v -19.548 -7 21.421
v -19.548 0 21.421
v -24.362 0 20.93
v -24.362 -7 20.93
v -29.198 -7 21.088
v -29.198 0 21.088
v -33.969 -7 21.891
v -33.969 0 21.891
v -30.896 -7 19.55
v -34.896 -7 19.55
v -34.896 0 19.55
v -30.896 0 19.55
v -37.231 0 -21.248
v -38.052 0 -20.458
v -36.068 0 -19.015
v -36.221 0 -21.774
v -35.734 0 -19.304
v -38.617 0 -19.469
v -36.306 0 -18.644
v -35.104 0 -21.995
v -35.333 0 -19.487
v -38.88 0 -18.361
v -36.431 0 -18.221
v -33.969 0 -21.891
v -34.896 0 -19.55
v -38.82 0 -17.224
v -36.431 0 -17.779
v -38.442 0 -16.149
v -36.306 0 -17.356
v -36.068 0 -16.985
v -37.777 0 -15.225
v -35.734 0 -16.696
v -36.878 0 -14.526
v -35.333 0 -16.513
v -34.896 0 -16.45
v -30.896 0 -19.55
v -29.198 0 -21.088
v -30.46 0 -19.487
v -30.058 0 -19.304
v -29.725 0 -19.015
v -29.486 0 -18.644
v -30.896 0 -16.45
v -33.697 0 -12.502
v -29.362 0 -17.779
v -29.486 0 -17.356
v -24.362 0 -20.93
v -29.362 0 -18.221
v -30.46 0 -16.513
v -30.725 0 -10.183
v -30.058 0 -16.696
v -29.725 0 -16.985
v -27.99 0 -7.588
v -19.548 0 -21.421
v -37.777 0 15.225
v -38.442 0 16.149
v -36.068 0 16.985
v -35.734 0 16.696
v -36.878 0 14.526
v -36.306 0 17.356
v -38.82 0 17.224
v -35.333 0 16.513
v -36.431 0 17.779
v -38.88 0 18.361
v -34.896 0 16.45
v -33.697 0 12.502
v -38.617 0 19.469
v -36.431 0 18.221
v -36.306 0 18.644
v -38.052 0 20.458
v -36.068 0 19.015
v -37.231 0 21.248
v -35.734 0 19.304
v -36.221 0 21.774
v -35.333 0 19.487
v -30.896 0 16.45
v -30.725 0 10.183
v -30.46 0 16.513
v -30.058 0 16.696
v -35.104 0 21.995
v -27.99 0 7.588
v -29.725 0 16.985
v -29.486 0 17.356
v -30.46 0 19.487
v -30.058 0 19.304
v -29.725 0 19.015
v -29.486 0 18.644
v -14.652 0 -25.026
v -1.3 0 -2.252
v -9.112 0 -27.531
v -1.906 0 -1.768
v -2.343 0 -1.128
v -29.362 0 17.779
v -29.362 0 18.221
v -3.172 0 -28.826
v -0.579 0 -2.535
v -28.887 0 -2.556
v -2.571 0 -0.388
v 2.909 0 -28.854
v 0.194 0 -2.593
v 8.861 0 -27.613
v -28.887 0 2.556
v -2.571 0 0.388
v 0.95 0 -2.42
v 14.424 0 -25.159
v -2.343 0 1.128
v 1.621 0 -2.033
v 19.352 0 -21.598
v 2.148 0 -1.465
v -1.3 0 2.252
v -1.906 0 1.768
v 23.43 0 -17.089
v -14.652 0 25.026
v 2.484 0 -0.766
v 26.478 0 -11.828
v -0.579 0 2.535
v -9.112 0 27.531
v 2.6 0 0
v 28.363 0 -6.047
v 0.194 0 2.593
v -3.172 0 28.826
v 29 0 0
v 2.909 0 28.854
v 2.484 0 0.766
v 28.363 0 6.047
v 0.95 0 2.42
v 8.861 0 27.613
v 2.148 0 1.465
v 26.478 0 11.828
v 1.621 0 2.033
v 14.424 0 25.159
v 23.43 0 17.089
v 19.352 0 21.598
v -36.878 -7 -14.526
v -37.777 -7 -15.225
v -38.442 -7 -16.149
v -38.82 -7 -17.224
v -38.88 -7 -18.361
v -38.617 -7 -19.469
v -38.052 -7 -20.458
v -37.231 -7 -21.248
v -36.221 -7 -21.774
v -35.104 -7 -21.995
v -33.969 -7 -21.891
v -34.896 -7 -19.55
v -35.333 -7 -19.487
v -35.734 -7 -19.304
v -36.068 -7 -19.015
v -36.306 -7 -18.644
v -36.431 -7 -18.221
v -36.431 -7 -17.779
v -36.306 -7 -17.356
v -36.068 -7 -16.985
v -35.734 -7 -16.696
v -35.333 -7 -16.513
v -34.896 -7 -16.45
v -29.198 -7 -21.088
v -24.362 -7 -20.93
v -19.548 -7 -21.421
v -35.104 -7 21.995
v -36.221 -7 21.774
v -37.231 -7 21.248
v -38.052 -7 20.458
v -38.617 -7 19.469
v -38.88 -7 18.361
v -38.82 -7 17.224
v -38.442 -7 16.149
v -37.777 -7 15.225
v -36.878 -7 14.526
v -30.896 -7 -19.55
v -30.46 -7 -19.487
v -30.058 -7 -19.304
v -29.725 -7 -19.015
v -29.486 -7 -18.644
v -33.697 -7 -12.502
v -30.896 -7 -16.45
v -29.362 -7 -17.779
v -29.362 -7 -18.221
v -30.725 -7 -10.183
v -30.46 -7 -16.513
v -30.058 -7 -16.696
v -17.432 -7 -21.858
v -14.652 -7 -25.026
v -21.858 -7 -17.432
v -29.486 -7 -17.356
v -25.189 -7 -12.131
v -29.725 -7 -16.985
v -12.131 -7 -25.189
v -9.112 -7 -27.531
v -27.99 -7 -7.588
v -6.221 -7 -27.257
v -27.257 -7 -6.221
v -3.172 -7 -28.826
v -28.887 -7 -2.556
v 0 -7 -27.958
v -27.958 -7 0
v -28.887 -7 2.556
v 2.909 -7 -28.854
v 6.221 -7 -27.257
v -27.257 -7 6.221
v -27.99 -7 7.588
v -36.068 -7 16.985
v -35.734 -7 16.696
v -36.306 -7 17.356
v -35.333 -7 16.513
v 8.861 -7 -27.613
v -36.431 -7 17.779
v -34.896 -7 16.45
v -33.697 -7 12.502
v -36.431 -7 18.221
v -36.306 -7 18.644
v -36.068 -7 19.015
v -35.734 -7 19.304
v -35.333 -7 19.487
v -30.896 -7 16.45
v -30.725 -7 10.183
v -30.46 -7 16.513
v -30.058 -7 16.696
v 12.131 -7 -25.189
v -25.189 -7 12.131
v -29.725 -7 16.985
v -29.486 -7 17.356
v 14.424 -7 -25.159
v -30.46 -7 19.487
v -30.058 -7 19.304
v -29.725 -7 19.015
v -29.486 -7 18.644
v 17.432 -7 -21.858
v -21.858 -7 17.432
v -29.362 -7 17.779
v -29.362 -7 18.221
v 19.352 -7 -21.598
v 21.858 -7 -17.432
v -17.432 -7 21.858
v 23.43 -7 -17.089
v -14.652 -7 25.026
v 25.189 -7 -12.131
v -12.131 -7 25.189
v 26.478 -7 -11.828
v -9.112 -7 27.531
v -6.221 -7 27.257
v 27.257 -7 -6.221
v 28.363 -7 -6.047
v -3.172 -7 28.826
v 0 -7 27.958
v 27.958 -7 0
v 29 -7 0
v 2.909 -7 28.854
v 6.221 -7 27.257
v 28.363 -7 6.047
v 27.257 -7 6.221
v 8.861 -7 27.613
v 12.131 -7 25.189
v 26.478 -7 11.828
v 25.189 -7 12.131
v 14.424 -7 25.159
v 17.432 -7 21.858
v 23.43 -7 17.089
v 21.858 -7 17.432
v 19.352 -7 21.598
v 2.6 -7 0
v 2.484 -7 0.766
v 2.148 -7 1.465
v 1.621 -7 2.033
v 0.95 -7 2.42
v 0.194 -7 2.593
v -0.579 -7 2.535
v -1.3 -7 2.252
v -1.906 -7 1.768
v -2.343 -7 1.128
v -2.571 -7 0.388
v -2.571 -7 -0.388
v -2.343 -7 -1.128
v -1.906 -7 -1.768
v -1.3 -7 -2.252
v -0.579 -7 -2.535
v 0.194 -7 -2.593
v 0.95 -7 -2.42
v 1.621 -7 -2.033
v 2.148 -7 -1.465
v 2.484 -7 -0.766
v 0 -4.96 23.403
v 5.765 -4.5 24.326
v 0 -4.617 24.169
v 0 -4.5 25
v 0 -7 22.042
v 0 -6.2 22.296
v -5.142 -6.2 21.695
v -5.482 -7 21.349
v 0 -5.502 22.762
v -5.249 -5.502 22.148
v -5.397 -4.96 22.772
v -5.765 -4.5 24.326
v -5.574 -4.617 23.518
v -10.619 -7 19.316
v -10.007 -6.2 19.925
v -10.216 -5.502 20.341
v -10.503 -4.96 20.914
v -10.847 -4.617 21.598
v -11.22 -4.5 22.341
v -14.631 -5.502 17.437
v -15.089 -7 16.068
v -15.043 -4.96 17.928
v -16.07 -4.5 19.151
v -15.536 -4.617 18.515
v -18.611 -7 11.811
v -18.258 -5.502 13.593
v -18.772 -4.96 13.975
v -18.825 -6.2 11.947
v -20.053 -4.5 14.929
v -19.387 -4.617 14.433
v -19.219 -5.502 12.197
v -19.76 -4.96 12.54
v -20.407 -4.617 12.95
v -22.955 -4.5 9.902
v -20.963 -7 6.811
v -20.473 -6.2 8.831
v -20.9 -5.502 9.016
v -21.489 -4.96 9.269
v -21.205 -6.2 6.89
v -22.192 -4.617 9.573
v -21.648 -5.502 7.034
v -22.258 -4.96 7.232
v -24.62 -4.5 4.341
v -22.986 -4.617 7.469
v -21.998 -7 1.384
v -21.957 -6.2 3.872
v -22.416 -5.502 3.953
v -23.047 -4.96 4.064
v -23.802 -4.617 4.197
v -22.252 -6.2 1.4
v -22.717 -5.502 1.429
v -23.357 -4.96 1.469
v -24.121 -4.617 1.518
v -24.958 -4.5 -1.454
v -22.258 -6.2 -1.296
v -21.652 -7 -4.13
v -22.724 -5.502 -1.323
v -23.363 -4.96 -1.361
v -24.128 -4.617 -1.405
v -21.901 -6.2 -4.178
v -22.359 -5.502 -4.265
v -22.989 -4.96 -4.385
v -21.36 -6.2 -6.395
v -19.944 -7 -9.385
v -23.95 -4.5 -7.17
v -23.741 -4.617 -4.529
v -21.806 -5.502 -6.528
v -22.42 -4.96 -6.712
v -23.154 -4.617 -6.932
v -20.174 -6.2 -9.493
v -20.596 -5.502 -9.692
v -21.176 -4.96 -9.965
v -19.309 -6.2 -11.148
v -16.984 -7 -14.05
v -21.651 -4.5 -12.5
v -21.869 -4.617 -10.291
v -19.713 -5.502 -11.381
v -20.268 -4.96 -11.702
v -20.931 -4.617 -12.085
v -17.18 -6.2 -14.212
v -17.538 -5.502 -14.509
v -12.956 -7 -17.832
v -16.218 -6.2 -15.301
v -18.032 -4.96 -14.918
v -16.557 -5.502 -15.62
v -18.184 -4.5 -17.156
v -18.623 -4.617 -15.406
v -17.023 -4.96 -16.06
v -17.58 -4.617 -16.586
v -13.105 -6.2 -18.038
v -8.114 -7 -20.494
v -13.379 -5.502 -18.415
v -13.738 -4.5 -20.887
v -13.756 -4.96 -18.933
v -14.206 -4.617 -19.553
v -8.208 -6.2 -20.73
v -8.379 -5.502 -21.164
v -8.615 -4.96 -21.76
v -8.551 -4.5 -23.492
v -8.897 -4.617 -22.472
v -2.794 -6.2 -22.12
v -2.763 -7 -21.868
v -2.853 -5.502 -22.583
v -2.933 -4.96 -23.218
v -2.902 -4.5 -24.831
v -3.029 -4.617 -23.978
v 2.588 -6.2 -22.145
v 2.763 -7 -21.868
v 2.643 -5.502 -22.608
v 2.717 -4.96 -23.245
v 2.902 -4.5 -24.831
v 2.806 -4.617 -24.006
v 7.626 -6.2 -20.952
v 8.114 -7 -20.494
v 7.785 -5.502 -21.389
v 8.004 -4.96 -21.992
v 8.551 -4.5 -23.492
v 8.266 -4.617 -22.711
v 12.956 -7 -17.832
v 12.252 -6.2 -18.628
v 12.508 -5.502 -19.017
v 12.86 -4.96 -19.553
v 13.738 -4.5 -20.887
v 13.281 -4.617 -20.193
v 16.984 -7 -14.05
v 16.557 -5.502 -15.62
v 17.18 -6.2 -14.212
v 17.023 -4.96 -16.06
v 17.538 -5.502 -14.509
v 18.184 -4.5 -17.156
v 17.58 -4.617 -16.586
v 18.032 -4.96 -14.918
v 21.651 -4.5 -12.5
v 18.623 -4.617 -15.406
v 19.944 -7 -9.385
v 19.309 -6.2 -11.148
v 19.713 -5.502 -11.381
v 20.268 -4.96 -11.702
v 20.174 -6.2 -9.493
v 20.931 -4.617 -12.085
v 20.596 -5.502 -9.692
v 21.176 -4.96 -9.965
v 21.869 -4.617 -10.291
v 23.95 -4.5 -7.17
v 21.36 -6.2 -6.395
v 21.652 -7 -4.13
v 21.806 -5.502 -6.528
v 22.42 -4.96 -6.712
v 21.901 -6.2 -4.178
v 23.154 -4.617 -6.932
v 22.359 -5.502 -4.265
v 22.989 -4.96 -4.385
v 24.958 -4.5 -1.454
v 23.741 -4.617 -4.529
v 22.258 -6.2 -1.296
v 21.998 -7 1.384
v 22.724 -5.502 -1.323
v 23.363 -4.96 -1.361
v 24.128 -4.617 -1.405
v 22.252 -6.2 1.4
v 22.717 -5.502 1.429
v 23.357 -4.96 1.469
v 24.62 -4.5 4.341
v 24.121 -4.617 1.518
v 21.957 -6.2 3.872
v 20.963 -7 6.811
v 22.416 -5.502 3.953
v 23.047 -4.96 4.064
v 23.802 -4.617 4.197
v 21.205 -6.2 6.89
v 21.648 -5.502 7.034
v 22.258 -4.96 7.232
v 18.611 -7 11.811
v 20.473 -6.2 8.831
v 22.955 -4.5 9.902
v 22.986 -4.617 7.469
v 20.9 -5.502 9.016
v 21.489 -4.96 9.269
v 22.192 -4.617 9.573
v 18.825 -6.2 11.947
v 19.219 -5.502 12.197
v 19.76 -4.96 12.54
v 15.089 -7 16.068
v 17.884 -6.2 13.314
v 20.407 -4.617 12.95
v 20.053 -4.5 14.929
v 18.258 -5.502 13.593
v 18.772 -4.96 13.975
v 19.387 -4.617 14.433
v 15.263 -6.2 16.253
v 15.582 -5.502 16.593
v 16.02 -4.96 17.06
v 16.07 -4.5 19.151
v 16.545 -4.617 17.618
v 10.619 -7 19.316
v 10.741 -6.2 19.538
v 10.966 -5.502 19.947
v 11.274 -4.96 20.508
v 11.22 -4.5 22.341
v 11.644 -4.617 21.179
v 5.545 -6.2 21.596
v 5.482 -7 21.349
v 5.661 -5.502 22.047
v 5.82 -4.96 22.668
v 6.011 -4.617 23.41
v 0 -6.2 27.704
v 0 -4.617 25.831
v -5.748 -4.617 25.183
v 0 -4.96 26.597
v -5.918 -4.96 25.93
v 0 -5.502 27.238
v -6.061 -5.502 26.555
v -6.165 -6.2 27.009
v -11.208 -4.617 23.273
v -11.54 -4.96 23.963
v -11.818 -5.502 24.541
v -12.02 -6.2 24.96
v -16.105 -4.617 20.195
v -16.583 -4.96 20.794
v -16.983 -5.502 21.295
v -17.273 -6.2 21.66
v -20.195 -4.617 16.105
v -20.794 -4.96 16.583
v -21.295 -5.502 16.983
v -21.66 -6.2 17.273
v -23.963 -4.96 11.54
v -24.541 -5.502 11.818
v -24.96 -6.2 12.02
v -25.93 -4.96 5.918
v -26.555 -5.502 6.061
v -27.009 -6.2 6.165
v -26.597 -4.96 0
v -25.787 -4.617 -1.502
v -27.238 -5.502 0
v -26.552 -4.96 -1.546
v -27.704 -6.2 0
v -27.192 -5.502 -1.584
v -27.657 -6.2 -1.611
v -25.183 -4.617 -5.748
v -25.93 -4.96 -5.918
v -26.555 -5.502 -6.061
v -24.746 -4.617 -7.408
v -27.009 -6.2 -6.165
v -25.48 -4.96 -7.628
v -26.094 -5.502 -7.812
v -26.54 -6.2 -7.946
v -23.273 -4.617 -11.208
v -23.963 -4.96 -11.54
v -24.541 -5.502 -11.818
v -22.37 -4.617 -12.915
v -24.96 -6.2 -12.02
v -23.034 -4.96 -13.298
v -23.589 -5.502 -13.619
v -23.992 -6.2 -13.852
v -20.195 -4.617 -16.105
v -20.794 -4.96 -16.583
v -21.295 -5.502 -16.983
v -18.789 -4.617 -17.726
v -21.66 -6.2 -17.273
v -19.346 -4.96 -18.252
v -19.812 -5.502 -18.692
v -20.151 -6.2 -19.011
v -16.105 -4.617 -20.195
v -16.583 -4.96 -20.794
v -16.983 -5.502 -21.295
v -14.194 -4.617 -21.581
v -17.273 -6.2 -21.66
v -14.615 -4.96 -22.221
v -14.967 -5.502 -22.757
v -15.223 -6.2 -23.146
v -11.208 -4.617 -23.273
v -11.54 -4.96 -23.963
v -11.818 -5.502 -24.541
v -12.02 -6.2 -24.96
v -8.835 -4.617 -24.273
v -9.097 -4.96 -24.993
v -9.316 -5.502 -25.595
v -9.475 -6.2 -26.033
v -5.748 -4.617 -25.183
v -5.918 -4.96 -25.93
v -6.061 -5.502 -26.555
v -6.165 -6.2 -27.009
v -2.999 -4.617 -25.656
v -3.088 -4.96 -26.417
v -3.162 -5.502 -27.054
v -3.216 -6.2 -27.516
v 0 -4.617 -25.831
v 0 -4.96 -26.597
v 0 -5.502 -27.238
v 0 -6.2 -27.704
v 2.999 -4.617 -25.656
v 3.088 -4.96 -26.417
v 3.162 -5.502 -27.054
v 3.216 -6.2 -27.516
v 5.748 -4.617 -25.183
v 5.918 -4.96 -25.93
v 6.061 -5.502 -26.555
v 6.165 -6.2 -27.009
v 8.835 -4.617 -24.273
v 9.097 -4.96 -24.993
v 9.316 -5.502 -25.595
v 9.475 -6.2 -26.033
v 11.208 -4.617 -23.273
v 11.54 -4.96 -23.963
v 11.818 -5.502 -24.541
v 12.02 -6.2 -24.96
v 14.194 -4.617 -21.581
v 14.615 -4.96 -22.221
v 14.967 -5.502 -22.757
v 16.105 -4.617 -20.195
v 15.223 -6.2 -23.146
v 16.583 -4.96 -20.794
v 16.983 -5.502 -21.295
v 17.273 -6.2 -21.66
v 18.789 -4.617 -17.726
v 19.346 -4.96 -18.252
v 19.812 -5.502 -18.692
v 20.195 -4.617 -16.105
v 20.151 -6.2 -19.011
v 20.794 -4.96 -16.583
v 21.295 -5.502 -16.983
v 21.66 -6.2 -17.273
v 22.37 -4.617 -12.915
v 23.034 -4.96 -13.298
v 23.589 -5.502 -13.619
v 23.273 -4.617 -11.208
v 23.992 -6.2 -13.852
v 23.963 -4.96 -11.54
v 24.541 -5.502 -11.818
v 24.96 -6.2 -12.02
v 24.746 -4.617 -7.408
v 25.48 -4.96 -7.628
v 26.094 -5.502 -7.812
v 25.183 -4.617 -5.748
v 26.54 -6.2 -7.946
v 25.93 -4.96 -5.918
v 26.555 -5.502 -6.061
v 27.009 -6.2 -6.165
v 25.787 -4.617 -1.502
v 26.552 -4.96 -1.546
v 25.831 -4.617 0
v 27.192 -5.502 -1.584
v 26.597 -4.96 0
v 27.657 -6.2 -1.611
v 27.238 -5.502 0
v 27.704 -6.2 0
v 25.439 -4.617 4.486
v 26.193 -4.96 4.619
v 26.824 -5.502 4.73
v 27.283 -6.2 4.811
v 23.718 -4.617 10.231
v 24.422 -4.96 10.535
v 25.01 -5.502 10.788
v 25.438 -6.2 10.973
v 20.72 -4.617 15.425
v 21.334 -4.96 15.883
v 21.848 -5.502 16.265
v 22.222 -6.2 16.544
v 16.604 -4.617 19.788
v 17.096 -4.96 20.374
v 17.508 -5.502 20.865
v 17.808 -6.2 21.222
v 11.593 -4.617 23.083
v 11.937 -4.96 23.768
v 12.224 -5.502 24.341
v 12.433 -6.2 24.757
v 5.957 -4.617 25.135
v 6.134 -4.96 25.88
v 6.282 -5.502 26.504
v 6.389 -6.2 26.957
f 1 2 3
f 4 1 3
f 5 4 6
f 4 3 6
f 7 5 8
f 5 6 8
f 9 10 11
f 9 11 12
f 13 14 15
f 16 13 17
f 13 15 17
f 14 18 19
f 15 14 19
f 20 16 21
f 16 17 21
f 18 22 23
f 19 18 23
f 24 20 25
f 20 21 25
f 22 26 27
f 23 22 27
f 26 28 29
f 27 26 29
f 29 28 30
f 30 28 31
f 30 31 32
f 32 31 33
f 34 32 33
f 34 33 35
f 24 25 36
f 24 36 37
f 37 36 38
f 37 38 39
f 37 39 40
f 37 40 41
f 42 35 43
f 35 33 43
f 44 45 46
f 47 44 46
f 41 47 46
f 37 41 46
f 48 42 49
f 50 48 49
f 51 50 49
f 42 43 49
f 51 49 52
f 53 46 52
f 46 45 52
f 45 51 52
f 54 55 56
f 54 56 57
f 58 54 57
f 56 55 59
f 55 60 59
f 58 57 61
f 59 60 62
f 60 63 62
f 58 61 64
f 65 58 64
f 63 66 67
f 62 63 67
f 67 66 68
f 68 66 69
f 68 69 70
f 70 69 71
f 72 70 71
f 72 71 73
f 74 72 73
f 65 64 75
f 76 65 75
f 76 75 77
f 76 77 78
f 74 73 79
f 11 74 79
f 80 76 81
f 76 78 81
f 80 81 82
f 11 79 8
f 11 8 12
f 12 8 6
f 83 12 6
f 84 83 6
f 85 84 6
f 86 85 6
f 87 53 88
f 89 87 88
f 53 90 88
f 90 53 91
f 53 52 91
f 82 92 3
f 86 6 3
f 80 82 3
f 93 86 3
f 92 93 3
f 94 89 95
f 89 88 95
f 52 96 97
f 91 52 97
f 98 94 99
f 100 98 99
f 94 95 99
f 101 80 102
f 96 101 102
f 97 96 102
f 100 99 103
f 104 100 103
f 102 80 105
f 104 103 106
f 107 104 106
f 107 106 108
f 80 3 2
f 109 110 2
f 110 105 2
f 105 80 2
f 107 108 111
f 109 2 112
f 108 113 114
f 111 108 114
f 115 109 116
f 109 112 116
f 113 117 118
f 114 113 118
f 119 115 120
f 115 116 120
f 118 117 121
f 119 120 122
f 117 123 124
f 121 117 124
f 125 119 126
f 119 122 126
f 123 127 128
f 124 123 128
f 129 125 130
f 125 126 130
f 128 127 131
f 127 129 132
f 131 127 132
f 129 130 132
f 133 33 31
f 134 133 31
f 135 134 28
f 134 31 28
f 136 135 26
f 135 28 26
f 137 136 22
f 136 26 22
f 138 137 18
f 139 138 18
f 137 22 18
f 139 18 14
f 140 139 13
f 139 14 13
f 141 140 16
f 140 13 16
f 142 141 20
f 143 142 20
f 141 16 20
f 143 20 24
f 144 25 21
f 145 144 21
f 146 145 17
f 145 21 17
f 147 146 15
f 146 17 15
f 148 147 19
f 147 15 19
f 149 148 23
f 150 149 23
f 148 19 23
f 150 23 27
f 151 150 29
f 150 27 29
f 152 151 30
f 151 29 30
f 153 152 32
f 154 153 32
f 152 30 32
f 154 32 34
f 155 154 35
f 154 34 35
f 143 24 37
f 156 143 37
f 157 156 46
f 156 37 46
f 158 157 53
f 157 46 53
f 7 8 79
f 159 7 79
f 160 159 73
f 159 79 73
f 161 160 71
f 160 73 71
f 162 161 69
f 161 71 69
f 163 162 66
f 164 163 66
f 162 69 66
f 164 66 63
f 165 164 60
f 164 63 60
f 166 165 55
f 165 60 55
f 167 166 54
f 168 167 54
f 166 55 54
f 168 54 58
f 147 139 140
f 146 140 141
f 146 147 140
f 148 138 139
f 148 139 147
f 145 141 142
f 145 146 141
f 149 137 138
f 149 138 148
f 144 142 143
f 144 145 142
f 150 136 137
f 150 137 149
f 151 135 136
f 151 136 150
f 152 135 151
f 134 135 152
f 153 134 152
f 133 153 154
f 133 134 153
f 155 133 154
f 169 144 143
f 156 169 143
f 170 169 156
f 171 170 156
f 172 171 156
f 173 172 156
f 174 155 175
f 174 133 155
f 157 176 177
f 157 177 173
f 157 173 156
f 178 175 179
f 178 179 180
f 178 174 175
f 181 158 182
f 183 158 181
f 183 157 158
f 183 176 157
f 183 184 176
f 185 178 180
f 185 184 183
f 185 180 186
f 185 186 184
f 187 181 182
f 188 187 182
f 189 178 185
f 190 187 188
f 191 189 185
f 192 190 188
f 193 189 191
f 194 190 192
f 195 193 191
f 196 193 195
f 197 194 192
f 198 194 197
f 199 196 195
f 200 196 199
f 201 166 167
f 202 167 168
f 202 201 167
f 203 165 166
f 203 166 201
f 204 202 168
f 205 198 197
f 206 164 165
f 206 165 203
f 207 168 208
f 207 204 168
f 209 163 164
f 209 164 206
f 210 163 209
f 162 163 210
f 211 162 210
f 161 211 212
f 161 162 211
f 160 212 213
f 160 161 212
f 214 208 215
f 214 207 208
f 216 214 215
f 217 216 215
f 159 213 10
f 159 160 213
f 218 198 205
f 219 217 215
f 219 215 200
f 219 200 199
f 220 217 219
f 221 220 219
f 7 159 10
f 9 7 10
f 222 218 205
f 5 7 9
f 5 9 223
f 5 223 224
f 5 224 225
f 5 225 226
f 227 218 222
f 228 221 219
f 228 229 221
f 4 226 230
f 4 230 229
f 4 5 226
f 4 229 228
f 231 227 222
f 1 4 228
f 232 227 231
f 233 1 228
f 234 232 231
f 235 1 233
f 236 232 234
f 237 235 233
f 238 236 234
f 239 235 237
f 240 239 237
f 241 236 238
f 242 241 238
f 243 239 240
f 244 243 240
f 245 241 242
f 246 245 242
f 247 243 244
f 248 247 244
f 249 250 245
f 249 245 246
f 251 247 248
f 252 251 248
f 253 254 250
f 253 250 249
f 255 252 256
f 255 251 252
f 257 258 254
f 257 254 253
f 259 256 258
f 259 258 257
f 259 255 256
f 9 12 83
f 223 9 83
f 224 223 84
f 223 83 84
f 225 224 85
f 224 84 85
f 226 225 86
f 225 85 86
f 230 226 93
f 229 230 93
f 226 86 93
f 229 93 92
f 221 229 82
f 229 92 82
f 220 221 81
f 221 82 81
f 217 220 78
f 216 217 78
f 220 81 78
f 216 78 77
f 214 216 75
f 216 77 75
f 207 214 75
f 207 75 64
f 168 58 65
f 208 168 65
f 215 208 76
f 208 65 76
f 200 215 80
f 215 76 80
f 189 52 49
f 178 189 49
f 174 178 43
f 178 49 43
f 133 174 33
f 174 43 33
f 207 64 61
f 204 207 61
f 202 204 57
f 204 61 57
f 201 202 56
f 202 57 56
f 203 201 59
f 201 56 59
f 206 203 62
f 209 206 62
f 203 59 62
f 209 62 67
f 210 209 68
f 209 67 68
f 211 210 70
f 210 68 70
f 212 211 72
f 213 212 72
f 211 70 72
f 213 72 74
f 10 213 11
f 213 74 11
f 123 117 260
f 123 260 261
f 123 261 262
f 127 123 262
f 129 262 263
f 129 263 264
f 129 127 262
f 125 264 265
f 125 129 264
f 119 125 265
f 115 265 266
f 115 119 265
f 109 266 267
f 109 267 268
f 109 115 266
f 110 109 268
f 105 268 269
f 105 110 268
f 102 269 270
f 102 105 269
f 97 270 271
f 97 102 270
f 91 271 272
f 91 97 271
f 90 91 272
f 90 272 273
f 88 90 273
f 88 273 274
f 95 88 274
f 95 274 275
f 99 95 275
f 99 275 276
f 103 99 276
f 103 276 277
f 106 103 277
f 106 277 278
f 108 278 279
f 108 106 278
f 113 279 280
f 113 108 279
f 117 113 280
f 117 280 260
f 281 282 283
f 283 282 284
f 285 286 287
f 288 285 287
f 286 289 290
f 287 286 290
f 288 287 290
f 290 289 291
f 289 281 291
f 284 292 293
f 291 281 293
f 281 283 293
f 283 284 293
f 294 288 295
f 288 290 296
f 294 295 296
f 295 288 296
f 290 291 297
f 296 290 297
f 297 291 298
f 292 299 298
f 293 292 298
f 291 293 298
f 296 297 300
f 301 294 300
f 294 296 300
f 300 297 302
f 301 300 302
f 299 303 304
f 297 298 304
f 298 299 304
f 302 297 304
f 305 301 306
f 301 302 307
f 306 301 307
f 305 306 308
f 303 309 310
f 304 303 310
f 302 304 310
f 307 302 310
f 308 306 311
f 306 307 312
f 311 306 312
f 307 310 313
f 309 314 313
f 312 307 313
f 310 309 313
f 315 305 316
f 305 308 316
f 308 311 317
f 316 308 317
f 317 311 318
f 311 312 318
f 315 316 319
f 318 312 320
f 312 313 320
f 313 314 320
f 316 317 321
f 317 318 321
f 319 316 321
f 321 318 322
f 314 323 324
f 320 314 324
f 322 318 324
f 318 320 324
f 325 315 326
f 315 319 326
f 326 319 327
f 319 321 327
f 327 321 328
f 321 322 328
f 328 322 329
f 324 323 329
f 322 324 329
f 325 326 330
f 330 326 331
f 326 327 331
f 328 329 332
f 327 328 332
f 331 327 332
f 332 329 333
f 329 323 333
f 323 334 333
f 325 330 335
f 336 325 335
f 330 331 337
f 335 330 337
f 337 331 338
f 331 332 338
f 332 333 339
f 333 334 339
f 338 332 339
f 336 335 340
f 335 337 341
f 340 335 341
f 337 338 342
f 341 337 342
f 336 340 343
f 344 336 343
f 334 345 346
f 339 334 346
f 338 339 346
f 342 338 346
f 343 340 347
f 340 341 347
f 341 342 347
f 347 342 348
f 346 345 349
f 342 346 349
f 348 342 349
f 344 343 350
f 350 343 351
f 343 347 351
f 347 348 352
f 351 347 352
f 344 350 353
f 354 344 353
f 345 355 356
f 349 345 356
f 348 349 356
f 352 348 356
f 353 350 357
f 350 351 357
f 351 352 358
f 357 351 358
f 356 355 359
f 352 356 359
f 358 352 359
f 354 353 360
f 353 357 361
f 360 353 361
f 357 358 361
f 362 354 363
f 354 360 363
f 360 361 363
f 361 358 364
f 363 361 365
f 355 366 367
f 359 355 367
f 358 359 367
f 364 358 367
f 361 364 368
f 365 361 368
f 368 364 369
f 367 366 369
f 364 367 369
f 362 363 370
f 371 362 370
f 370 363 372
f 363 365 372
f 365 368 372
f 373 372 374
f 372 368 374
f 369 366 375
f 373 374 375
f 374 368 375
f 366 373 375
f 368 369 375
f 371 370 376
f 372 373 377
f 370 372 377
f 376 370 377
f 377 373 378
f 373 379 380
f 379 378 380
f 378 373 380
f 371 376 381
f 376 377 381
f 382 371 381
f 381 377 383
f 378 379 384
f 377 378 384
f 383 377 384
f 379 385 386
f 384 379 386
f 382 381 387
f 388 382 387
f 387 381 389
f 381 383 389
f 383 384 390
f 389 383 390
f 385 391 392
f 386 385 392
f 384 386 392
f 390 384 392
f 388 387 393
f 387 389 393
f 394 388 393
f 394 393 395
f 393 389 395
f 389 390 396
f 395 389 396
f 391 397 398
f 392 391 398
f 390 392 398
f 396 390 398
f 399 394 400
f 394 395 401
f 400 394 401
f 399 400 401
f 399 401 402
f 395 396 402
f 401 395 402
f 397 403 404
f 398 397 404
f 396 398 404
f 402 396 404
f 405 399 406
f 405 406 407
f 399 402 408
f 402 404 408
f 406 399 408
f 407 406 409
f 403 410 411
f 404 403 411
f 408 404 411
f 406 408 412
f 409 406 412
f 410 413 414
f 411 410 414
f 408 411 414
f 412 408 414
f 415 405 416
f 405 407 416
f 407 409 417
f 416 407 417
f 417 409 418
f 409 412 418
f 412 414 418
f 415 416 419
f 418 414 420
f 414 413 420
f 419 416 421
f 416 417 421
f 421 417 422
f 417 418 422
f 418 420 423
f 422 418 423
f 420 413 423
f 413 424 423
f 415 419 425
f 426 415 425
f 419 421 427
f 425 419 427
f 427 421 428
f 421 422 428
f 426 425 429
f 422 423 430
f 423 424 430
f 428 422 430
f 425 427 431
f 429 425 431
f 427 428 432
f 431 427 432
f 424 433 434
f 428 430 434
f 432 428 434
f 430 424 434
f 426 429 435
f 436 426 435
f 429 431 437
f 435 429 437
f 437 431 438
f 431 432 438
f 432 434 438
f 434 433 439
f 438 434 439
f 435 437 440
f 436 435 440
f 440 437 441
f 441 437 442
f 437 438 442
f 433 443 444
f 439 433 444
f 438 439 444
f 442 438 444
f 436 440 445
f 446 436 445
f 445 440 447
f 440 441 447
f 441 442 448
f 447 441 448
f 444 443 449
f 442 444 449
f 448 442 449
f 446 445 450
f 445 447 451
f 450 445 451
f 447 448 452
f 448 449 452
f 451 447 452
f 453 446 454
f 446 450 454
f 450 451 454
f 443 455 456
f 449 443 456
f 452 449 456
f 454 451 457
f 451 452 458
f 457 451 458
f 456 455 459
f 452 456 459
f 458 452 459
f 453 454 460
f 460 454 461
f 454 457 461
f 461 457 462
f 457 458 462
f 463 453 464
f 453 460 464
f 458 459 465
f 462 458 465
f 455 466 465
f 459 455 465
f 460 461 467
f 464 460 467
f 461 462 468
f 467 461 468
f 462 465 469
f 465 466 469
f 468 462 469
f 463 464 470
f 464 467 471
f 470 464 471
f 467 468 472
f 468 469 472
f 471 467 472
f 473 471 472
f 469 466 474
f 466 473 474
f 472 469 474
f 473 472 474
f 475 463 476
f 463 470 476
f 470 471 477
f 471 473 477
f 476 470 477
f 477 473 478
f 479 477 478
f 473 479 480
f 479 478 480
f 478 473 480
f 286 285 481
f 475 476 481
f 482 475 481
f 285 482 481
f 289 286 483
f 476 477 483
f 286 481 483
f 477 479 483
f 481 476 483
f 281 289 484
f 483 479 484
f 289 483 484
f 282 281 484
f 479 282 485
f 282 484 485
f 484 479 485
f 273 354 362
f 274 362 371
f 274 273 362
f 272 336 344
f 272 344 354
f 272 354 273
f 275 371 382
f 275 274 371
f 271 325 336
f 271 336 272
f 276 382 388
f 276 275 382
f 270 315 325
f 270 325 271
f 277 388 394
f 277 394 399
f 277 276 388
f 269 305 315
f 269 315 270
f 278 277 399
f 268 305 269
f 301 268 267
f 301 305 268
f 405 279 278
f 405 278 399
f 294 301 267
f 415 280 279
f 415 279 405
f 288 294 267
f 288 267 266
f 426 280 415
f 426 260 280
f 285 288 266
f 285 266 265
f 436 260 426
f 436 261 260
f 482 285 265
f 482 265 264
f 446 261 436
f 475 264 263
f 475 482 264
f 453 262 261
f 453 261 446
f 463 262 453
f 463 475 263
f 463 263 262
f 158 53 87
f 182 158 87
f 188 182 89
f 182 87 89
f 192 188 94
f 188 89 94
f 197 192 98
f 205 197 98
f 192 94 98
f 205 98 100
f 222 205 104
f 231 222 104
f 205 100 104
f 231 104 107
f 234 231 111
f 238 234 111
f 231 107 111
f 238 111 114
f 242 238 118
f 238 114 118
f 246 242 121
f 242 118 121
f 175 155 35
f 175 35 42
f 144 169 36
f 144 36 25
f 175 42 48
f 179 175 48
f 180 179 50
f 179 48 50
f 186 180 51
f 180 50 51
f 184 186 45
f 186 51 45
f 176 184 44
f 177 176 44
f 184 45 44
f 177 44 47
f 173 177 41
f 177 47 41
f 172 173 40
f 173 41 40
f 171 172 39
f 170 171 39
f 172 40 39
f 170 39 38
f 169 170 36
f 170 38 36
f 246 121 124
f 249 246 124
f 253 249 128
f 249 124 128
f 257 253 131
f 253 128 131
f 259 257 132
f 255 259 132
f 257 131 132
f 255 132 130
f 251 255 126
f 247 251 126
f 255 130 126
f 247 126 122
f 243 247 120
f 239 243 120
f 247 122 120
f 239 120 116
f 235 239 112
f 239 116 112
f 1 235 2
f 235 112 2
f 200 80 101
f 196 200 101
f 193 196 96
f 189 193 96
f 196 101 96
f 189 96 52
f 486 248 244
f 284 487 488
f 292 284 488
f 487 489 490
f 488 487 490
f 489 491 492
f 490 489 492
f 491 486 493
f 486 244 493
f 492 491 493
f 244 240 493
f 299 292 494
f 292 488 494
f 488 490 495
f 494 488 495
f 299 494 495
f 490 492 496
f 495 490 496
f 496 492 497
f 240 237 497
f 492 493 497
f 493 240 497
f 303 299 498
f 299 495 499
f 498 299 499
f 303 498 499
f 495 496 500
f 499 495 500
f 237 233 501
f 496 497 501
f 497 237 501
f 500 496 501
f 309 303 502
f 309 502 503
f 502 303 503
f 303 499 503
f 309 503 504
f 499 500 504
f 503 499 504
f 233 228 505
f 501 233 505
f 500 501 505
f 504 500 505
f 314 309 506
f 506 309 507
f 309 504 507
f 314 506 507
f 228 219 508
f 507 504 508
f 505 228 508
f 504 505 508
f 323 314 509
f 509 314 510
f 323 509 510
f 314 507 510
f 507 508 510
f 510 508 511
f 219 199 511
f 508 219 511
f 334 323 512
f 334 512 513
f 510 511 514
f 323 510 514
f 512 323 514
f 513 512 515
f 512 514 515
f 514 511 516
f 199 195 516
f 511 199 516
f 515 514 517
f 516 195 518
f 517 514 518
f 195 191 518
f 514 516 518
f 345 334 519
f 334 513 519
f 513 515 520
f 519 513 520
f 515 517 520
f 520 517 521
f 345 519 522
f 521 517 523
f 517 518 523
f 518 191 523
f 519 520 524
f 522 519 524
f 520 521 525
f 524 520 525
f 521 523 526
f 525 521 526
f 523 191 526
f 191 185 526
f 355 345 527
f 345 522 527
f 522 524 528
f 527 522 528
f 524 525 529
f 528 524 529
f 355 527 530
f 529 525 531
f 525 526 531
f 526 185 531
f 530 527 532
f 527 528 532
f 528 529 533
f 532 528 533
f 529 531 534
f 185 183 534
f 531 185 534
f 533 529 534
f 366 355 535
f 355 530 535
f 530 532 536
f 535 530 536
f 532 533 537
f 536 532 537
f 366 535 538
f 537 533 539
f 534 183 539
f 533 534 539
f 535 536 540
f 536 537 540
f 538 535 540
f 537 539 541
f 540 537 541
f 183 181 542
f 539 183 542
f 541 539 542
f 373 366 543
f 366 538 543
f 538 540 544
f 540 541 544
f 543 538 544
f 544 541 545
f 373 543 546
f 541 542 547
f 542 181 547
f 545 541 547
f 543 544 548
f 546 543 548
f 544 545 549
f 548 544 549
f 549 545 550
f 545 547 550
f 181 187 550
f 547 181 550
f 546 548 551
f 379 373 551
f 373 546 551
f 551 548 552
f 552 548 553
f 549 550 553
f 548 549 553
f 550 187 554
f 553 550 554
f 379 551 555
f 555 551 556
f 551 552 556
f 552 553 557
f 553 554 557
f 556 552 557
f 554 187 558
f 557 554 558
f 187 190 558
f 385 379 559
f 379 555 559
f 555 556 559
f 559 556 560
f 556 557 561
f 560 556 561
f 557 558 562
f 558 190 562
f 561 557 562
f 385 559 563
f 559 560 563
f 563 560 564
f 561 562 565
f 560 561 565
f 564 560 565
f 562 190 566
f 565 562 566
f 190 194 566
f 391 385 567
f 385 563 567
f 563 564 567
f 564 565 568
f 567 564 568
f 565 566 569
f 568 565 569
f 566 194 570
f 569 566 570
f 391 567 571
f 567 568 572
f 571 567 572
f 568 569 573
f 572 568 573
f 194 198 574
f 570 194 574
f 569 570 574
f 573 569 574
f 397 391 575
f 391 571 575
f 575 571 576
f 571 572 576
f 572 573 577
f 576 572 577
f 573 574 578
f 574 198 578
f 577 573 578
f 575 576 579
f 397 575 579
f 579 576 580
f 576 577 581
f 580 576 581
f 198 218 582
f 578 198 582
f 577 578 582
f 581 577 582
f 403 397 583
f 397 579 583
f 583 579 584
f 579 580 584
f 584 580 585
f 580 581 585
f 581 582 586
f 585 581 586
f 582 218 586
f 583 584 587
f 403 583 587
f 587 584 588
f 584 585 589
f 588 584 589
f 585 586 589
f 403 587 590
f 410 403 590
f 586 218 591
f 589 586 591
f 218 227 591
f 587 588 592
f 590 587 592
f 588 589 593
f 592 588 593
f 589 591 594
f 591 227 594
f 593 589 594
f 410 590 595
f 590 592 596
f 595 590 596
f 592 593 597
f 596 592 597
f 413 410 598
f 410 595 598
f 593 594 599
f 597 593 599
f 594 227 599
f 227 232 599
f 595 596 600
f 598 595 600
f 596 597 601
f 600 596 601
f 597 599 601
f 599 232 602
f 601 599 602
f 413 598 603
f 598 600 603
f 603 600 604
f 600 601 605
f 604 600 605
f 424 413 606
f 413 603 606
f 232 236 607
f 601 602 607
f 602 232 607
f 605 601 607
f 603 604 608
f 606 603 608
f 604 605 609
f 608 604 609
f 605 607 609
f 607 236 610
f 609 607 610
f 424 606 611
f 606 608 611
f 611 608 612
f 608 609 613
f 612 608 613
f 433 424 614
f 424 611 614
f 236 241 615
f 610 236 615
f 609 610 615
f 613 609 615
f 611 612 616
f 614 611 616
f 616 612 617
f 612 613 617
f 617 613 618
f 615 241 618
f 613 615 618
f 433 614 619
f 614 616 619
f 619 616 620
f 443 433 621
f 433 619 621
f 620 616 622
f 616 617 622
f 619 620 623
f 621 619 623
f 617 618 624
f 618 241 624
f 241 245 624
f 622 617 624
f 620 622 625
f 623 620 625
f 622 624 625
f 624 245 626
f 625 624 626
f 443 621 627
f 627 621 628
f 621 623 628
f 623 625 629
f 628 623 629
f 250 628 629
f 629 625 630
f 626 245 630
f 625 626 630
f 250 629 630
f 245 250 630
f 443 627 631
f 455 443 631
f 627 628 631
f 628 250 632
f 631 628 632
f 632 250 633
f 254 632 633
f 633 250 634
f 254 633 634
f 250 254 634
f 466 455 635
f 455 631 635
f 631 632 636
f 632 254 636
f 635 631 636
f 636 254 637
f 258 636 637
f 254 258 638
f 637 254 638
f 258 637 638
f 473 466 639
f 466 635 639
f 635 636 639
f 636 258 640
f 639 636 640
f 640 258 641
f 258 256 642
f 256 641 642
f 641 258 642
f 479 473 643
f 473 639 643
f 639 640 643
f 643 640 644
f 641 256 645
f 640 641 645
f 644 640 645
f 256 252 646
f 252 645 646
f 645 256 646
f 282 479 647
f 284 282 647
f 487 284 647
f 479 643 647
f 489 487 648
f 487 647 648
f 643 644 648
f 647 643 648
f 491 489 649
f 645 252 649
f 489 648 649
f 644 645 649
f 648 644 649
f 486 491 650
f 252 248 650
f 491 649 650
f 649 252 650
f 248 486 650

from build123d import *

# Parameters (mm, degrees)
F0_R     = 2.6
F1_DEPTH = 7
F2_R     = 3


# Not quite as in the source:
# - a feature names something its author has since deleted; it is built from what else it names


with BuildPart() as f1:
    # F0 (on Front) → F1 (new body)
    with BuildSketch(Plane.XZ):
        with BuildLine():
            ThreePointArc((-19.5484192549, -21.4210014853), (11.706746807, -26.5320952659), (29, 0))
            ThreePointArc((29, 0), (11.706746807, 26.5320952659), (-19.5484192549, 21.4210014853))
            ThreePointArc((-19.5484192549, 21.4210014853), (-24.7548164348, 15.1062590762), (-27.9895839317, 7.5883589353))
            ThreePointArc((-27.9895839317, 7.5883589353), (-29, 0), (-27.9895839317, -7.5883589353))
            ThreePointArc((-27.9895839317, -7.5883589353), (-24.7548164348, -15.1062590762), (-19.5484192549, -21.4210014853))
        make_face()
        Circle(F0_R, mode=Mode.SUBTRACT)
        with BuildLine():
            ThreePointArc((-27.9895839317, 7.5883589353), (-24.7548164348, 15.1062590762), (-19.5484192549, 21.4210014853))
            ThreePointArc((-19.5484192549, 21.4210014853), (-26.7826801614, 20.9280500488), (-33.9694734381, 21.8911359117))
            ThreePointArc((-33.9694734381, 21.8911359117), (-38.616718272, 19.4692528721), (-36.8782865714, 14.5255440189))
            ThreePointArc((-36.8782865714, 14.5255440189), (-32.1832277785, 11.3781861206), (-27.9895839317, 7.5883589353))
        make_face()
        with BuildLine():
            ThreePointArc((-34.8963290453, 16.45), (-36.4463290453, 18), (-34.8963290453, 19.55))
            Line((-34.8963290453, 19.55), (-30.8963290453, 19.55))
            ThreePointArc((-30.8963290453, 19.55), (-29.3463290453, 18), (-30.8963290453, 16.45))
            Line((-30.8963290453, 16.45), (-34.8963290453, 16.45))
        make_face(mode=Mode.SUBTRACT)
        with BuildLine():
            ThreePointArc((-33.9694734381, -21.8911359117), (-26.7826801614, -20.9280500488), (-19.5484192549, -21.4210014853))
            ThreePointArc((-19.5484192549, -21.4210014853), (-24.7548164348, -15.1062590762), (-27.9895839317, -7.5883589353))
            ThreePointArc((-27.9895839317, -7.5883589353), (-32.1832277785, -11.3781861206), (-36.8782865714, -14.5255440189))
            ThreePointArc((-36.8782865714, -14.5255440189), (-38.616718272, -19.4692528721), (-33.9694734381, -21.8911359117))
        make_face()
        with BuildLine():
            Line((-34.8963290453, -16.45), (-30.8963290453, -16.45))
            ThreePointArc((-30.8963290453, -16.45), (-29.3463290453, -18), (-30.8963290453, -19.55))
            Line((-30.8963290453, -19.55), (-34.8963290453, -19.55))
            ThreePointArc((-34.8963290453, -19.55), (-36.4463290453, -18), (-34.8963290453, -16.45))
        make_face(mode=Mode.SUBTRACT)
    extrude(amount=F1_DEPTH)

    # F2 (on Right) → F3 (revolve, cut)
    with BuildSketch(Plane.YZ):
        with Locations((-7.5, 25)):
            Circle(F2_R)
    revolve(axis=Axis((0, 0, 0), (0, -1, 0)), mode=Mode.SUBTRACT)


solid = f1.part
